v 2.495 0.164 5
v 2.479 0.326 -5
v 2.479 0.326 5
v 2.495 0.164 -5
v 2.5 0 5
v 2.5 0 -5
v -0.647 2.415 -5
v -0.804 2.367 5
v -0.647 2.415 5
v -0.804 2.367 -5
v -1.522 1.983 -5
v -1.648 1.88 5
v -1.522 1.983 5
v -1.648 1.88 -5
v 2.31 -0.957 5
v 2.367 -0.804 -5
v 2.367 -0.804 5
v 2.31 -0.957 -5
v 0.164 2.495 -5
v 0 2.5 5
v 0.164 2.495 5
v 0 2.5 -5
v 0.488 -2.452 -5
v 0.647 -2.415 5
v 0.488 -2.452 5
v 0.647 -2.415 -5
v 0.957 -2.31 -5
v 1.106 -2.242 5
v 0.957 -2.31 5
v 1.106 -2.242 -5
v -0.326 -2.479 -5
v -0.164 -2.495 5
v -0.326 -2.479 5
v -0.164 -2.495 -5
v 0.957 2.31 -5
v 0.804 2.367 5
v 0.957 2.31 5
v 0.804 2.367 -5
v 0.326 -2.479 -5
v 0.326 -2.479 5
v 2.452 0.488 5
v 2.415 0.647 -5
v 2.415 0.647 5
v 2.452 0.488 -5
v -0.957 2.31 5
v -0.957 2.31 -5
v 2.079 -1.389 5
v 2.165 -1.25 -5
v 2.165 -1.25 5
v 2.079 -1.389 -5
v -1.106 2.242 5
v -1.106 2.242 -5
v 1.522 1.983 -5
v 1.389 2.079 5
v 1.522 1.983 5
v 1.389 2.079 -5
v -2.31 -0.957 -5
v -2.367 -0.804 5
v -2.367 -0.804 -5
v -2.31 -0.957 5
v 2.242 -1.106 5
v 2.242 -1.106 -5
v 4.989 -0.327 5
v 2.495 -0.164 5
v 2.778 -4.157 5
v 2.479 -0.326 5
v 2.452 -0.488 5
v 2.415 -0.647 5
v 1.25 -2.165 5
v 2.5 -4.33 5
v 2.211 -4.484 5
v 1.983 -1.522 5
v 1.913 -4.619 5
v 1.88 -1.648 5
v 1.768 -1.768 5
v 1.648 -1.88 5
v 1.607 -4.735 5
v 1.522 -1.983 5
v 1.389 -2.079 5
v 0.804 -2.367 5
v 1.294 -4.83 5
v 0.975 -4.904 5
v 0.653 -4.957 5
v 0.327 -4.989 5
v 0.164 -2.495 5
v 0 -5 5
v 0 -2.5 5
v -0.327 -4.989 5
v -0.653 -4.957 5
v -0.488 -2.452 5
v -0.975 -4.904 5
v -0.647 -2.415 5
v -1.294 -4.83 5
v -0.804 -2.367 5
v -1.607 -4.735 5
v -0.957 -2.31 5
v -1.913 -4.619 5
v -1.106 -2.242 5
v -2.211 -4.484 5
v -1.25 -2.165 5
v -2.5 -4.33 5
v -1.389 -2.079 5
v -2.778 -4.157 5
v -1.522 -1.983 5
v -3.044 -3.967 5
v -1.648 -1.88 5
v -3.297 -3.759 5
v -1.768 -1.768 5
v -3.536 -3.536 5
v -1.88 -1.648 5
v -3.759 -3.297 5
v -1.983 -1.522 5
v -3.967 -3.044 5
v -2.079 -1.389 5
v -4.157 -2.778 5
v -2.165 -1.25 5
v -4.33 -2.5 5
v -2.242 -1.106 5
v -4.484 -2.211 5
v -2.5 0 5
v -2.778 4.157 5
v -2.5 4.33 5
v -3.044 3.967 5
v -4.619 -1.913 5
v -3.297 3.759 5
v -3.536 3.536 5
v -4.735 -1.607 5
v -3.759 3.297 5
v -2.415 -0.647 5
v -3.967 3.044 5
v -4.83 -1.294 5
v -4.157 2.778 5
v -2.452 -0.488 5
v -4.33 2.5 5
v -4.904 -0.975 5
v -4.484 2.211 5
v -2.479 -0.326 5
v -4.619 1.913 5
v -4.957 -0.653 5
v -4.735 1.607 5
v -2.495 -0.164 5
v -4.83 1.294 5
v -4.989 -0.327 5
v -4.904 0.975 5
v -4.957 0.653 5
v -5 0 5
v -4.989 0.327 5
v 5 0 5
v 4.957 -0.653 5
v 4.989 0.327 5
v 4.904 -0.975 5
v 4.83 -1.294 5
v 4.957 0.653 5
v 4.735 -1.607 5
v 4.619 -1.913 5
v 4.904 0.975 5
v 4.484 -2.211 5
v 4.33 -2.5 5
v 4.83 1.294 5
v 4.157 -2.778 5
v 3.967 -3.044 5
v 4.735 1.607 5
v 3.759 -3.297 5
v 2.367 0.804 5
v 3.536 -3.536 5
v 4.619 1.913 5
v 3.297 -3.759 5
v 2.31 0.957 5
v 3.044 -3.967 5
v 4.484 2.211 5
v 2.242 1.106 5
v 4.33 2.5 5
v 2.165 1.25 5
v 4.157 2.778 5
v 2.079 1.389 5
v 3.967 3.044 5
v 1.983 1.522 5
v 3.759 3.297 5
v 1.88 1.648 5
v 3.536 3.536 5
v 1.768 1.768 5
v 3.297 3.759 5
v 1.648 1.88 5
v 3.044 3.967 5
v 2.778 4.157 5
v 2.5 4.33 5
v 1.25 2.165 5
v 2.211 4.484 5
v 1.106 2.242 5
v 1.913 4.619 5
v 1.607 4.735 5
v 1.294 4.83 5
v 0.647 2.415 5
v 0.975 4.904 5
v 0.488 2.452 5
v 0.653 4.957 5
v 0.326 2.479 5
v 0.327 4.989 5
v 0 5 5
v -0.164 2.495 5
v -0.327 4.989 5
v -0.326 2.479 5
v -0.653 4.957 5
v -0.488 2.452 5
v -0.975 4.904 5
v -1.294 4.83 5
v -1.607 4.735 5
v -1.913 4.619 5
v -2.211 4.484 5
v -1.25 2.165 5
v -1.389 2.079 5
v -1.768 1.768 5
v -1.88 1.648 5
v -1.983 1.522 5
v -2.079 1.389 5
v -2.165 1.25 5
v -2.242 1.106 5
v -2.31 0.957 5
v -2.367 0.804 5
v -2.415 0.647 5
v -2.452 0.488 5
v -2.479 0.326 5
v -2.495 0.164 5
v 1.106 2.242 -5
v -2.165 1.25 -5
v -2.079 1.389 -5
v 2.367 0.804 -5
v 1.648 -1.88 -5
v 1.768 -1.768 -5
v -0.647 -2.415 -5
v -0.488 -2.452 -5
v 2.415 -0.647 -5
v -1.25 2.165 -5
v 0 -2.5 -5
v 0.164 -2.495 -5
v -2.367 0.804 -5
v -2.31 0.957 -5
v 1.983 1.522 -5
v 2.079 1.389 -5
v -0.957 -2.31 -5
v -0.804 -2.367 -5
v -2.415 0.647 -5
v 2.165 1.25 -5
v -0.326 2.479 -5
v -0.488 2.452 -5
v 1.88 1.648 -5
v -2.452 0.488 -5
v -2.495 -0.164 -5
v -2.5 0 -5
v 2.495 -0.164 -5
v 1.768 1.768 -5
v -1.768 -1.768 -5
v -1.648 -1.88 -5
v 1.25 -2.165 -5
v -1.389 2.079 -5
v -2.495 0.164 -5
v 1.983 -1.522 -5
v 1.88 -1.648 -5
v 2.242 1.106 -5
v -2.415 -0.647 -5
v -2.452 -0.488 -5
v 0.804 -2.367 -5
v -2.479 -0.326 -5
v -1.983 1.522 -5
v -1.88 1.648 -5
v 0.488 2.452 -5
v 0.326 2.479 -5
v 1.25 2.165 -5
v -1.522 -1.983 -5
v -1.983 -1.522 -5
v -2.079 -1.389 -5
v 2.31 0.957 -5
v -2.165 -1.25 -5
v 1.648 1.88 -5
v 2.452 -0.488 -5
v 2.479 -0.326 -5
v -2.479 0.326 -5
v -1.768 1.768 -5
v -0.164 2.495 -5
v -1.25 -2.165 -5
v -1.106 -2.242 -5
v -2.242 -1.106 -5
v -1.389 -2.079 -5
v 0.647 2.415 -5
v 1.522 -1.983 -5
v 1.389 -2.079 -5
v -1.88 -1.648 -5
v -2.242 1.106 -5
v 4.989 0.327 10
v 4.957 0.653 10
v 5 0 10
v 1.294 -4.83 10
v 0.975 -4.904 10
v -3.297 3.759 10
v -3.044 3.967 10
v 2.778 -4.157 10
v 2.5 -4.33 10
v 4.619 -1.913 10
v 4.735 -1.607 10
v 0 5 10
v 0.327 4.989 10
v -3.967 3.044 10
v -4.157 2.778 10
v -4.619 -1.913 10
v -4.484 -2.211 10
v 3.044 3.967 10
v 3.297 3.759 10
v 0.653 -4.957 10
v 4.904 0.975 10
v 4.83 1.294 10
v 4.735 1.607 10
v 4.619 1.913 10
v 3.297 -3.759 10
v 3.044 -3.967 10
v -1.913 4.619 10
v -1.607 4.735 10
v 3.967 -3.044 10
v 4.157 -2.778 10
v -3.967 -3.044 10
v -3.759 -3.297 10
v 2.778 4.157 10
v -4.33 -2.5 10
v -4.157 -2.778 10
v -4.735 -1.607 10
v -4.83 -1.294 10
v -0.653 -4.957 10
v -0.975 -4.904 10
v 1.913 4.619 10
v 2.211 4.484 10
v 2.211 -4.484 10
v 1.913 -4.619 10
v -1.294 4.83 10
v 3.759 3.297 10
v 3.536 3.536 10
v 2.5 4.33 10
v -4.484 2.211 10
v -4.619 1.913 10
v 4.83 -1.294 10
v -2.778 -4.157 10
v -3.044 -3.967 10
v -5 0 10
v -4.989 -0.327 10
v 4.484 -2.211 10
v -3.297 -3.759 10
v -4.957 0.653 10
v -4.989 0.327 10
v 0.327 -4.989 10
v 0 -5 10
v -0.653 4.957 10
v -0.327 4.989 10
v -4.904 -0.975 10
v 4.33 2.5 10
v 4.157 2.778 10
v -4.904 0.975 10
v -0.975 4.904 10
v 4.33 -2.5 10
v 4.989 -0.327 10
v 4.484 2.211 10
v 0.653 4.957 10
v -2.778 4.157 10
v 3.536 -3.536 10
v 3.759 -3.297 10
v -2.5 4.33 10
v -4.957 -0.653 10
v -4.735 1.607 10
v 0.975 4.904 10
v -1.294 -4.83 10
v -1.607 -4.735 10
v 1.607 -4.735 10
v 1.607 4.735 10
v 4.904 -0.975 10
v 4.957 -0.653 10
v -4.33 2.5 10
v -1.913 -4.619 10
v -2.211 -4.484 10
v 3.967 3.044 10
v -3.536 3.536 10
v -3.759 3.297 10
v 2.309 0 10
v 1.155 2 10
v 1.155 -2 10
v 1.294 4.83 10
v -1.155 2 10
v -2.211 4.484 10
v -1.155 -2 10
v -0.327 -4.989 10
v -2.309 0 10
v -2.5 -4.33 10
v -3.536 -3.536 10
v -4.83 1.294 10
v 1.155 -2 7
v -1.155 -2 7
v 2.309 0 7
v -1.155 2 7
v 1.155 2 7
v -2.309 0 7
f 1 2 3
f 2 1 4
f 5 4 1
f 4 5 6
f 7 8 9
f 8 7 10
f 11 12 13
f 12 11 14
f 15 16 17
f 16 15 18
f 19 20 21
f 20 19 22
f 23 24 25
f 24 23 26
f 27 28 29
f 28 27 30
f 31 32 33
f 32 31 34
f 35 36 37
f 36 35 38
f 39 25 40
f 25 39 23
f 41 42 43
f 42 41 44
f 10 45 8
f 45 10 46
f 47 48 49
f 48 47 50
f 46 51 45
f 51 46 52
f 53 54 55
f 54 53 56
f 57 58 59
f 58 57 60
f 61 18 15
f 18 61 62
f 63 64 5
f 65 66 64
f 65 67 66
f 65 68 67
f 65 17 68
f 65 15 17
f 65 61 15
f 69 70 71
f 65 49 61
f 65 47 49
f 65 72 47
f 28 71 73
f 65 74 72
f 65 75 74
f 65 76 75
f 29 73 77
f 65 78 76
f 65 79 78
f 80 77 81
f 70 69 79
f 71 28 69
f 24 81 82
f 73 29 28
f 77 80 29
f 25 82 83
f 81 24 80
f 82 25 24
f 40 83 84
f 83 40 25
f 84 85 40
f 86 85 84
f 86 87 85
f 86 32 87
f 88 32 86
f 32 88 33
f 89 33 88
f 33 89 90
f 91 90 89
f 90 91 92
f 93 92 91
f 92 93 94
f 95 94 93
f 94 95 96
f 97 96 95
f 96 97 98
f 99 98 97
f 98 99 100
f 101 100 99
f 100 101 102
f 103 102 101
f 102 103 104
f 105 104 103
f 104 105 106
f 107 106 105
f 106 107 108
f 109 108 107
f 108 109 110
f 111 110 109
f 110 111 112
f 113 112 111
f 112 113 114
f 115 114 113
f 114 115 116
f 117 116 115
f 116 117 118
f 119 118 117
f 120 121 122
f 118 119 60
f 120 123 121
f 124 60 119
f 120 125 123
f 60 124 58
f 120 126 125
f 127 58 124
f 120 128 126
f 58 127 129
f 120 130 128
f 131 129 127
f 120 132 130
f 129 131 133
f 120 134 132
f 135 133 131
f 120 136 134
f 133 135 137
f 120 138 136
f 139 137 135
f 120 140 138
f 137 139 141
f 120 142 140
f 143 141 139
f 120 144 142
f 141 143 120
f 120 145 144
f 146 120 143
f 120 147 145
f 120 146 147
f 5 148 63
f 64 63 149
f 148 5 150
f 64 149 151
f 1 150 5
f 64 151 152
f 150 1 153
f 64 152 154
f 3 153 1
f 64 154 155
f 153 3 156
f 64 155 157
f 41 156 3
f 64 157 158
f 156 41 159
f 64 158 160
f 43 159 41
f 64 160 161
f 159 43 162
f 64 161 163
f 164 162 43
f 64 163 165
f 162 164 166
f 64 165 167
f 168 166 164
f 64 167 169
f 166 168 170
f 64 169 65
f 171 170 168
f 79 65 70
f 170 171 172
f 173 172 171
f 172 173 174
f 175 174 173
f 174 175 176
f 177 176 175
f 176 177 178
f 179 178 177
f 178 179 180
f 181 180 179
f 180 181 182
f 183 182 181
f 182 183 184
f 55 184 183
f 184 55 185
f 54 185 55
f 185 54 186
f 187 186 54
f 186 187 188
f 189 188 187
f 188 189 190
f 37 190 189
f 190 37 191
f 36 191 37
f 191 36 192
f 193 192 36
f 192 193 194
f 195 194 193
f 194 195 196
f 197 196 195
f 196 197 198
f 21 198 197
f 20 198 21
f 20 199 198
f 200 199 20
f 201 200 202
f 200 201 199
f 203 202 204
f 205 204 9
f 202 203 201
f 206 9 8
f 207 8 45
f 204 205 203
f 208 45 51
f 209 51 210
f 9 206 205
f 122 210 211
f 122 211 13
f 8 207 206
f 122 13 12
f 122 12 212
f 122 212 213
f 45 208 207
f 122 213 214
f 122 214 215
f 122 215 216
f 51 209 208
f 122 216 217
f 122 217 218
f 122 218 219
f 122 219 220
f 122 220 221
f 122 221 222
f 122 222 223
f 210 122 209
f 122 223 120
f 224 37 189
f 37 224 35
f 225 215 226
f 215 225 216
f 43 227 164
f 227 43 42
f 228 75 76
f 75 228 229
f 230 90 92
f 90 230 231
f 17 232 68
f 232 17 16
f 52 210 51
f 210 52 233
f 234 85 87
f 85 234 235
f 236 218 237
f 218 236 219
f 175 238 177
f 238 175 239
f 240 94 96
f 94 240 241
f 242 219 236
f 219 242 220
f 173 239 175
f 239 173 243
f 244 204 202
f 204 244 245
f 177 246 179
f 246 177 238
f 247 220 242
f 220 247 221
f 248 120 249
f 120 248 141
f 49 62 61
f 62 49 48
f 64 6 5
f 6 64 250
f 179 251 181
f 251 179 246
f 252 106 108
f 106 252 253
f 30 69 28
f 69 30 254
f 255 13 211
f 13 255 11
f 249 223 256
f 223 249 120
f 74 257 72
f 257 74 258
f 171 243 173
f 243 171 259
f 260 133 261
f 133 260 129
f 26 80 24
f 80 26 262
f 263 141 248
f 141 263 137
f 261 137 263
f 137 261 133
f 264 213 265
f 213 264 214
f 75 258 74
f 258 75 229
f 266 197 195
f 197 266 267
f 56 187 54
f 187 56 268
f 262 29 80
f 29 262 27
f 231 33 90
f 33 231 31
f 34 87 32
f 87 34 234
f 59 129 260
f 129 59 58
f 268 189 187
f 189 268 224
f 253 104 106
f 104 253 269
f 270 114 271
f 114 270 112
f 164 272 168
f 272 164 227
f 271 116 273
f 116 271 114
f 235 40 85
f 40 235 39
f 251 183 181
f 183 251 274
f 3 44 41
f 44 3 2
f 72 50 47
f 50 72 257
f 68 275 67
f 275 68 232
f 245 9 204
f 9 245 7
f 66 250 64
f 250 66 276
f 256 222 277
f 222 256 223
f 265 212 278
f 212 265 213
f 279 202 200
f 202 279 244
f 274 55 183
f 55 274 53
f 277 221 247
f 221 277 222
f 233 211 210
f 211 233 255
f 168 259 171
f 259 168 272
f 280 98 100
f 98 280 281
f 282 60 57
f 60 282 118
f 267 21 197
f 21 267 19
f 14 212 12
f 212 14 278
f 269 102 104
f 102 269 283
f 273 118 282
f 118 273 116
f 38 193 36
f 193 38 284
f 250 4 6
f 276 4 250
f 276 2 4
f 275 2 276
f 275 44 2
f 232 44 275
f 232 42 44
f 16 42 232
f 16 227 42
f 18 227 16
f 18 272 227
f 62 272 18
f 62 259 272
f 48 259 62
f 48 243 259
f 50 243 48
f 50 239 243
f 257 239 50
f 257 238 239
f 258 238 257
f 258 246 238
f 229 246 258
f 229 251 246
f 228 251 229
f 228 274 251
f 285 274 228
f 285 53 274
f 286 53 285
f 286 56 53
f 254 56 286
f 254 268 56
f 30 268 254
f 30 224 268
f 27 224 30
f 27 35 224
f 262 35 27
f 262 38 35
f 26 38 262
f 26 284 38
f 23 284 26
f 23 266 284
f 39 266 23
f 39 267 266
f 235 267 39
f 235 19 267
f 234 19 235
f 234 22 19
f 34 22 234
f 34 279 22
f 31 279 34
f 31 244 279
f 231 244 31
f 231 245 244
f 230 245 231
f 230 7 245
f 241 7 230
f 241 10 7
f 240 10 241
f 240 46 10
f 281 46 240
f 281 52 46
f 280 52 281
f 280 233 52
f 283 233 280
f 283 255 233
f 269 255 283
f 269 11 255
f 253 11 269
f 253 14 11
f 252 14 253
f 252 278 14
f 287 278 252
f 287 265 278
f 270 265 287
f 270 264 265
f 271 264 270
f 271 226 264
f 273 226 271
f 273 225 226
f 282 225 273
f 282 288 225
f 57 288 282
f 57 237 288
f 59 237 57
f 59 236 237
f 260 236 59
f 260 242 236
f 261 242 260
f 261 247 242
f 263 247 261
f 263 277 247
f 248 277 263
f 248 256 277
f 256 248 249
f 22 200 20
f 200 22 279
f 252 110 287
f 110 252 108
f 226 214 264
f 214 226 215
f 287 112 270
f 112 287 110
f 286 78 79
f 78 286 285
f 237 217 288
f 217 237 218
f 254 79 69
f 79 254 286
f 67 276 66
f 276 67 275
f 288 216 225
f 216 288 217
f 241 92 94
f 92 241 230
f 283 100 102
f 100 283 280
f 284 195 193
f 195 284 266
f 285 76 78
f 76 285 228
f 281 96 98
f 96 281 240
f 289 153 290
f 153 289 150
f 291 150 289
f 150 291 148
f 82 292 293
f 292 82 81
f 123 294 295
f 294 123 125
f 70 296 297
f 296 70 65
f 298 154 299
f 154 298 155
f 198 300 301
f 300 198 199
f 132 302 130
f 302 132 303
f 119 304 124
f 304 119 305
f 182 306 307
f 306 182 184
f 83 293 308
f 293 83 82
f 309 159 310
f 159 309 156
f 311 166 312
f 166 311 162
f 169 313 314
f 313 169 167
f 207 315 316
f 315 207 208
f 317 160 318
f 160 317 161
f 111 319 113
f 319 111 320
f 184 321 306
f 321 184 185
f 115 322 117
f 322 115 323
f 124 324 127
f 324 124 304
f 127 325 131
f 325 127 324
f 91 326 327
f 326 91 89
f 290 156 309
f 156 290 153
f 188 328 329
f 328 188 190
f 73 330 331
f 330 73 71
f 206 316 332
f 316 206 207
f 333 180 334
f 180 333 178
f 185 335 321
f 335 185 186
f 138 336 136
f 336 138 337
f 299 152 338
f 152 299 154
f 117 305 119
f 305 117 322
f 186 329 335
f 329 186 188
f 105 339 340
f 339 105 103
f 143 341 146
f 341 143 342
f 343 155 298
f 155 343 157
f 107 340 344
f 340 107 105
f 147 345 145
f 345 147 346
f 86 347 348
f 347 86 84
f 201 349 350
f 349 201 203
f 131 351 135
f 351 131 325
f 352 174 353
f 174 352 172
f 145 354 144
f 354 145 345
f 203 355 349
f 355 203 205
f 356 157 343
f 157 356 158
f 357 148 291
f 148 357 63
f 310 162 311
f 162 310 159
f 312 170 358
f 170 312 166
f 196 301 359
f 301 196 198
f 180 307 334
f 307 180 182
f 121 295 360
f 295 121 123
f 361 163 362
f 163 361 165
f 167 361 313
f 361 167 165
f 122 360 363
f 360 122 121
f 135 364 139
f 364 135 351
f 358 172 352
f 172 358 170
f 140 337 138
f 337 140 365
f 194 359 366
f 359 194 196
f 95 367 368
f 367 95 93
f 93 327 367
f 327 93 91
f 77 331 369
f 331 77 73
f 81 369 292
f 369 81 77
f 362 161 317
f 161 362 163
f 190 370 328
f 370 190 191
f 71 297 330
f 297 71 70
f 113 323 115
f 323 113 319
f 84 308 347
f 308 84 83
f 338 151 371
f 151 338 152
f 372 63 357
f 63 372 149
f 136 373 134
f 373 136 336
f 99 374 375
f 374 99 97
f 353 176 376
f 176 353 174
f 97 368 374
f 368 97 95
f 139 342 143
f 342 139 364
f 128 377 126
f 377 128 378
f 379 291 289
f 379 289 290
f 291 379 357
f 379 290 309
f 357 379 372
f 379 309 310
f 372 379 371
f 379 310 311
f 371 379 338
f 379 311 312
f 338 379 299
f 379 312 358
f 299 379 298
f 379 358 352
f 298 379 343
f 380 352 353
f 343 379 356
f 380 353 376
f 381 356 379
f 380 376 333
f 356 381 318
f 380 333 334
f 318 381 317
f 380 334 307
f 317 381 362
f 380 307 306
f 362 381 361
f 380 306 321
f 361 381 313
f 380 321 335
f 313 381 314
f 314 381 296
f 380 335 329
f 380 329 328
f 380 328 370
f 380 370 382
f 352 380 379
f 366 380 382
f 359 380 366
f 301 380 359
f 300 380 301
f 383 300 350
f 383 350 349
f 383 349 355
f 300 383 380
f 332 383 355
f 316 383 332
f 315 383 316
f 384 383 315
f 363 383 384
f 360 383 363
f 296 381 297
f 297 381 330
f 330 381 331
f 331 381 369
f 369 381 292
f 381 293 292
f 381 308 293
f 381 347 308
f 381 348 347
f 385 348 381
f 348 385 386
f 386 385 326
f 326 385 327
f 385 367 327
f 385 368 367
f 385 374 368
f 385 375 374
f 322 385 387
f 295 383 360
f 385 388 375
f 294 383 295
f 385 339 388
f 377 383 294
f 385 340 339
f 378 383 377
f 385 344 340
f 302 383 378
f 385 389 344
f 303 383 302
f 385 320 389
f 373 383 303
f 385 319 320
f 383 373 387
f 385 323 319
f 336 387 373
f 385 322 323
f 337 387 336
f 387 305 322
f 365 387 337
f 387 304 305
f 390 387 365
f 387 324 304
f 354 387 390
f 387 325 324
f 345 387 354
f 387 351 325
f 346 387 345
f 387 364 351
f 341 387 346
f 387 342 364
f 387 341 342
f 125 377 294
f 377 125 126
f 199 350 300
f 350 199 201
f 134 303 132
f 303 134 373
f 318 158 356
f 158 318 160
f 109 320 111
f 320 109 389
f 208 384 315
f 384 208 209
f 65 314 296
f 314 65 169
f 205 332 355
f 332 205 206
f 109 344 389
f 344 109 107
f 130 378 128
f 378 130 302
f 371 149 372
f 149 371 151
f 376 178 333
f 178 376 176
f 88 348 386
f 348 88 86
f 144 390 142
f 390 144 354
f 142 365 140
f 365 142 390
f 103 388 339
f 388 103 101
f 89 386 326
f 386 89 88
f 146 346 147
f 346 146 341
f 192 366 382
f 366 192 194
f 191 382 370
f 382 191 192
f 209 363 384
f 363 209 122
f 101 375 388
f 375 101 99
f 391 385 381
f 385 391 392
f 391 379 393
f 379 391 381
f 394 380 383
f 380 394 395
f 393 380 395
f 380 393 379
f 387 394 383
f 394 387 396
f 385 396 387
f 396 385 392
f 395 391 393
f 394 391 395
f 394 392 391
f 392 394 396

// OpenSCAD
$fn=96;

d_shank = 5.0;
l_shank = 10.0;

d_head = 10.0;
h_head = 5.0;

hex_flat = 4.0;
hex_depth = 3.0;

module hex_prism(flat=4, h=3) {
    r = flat / sqrt(3);
    cylinder(h=h, r=r, $fn=6);
}

module socket_head_cap_screw(d=5, l=10, dh=10, hh=5, hex_flat=4, hex_depth=3) {
    difference() {
        union() {
            translate([0,0,-l/2]) cylinder(h=l, d=d);
            translate([0,0,l/2]) cylinder(h=hh, d=dh);
        }
        translate([0,0,l/2 + hh - hex_depth]) hex_prism(flat=hex_flat, h=hex_depth + 0.2);
    }
}

socket_head_cap_screw(d=d_shank, l=l_shank, dh=d_head, hh=h_head, hex_flat=hex_flat, hex_depth=hex_depth);
